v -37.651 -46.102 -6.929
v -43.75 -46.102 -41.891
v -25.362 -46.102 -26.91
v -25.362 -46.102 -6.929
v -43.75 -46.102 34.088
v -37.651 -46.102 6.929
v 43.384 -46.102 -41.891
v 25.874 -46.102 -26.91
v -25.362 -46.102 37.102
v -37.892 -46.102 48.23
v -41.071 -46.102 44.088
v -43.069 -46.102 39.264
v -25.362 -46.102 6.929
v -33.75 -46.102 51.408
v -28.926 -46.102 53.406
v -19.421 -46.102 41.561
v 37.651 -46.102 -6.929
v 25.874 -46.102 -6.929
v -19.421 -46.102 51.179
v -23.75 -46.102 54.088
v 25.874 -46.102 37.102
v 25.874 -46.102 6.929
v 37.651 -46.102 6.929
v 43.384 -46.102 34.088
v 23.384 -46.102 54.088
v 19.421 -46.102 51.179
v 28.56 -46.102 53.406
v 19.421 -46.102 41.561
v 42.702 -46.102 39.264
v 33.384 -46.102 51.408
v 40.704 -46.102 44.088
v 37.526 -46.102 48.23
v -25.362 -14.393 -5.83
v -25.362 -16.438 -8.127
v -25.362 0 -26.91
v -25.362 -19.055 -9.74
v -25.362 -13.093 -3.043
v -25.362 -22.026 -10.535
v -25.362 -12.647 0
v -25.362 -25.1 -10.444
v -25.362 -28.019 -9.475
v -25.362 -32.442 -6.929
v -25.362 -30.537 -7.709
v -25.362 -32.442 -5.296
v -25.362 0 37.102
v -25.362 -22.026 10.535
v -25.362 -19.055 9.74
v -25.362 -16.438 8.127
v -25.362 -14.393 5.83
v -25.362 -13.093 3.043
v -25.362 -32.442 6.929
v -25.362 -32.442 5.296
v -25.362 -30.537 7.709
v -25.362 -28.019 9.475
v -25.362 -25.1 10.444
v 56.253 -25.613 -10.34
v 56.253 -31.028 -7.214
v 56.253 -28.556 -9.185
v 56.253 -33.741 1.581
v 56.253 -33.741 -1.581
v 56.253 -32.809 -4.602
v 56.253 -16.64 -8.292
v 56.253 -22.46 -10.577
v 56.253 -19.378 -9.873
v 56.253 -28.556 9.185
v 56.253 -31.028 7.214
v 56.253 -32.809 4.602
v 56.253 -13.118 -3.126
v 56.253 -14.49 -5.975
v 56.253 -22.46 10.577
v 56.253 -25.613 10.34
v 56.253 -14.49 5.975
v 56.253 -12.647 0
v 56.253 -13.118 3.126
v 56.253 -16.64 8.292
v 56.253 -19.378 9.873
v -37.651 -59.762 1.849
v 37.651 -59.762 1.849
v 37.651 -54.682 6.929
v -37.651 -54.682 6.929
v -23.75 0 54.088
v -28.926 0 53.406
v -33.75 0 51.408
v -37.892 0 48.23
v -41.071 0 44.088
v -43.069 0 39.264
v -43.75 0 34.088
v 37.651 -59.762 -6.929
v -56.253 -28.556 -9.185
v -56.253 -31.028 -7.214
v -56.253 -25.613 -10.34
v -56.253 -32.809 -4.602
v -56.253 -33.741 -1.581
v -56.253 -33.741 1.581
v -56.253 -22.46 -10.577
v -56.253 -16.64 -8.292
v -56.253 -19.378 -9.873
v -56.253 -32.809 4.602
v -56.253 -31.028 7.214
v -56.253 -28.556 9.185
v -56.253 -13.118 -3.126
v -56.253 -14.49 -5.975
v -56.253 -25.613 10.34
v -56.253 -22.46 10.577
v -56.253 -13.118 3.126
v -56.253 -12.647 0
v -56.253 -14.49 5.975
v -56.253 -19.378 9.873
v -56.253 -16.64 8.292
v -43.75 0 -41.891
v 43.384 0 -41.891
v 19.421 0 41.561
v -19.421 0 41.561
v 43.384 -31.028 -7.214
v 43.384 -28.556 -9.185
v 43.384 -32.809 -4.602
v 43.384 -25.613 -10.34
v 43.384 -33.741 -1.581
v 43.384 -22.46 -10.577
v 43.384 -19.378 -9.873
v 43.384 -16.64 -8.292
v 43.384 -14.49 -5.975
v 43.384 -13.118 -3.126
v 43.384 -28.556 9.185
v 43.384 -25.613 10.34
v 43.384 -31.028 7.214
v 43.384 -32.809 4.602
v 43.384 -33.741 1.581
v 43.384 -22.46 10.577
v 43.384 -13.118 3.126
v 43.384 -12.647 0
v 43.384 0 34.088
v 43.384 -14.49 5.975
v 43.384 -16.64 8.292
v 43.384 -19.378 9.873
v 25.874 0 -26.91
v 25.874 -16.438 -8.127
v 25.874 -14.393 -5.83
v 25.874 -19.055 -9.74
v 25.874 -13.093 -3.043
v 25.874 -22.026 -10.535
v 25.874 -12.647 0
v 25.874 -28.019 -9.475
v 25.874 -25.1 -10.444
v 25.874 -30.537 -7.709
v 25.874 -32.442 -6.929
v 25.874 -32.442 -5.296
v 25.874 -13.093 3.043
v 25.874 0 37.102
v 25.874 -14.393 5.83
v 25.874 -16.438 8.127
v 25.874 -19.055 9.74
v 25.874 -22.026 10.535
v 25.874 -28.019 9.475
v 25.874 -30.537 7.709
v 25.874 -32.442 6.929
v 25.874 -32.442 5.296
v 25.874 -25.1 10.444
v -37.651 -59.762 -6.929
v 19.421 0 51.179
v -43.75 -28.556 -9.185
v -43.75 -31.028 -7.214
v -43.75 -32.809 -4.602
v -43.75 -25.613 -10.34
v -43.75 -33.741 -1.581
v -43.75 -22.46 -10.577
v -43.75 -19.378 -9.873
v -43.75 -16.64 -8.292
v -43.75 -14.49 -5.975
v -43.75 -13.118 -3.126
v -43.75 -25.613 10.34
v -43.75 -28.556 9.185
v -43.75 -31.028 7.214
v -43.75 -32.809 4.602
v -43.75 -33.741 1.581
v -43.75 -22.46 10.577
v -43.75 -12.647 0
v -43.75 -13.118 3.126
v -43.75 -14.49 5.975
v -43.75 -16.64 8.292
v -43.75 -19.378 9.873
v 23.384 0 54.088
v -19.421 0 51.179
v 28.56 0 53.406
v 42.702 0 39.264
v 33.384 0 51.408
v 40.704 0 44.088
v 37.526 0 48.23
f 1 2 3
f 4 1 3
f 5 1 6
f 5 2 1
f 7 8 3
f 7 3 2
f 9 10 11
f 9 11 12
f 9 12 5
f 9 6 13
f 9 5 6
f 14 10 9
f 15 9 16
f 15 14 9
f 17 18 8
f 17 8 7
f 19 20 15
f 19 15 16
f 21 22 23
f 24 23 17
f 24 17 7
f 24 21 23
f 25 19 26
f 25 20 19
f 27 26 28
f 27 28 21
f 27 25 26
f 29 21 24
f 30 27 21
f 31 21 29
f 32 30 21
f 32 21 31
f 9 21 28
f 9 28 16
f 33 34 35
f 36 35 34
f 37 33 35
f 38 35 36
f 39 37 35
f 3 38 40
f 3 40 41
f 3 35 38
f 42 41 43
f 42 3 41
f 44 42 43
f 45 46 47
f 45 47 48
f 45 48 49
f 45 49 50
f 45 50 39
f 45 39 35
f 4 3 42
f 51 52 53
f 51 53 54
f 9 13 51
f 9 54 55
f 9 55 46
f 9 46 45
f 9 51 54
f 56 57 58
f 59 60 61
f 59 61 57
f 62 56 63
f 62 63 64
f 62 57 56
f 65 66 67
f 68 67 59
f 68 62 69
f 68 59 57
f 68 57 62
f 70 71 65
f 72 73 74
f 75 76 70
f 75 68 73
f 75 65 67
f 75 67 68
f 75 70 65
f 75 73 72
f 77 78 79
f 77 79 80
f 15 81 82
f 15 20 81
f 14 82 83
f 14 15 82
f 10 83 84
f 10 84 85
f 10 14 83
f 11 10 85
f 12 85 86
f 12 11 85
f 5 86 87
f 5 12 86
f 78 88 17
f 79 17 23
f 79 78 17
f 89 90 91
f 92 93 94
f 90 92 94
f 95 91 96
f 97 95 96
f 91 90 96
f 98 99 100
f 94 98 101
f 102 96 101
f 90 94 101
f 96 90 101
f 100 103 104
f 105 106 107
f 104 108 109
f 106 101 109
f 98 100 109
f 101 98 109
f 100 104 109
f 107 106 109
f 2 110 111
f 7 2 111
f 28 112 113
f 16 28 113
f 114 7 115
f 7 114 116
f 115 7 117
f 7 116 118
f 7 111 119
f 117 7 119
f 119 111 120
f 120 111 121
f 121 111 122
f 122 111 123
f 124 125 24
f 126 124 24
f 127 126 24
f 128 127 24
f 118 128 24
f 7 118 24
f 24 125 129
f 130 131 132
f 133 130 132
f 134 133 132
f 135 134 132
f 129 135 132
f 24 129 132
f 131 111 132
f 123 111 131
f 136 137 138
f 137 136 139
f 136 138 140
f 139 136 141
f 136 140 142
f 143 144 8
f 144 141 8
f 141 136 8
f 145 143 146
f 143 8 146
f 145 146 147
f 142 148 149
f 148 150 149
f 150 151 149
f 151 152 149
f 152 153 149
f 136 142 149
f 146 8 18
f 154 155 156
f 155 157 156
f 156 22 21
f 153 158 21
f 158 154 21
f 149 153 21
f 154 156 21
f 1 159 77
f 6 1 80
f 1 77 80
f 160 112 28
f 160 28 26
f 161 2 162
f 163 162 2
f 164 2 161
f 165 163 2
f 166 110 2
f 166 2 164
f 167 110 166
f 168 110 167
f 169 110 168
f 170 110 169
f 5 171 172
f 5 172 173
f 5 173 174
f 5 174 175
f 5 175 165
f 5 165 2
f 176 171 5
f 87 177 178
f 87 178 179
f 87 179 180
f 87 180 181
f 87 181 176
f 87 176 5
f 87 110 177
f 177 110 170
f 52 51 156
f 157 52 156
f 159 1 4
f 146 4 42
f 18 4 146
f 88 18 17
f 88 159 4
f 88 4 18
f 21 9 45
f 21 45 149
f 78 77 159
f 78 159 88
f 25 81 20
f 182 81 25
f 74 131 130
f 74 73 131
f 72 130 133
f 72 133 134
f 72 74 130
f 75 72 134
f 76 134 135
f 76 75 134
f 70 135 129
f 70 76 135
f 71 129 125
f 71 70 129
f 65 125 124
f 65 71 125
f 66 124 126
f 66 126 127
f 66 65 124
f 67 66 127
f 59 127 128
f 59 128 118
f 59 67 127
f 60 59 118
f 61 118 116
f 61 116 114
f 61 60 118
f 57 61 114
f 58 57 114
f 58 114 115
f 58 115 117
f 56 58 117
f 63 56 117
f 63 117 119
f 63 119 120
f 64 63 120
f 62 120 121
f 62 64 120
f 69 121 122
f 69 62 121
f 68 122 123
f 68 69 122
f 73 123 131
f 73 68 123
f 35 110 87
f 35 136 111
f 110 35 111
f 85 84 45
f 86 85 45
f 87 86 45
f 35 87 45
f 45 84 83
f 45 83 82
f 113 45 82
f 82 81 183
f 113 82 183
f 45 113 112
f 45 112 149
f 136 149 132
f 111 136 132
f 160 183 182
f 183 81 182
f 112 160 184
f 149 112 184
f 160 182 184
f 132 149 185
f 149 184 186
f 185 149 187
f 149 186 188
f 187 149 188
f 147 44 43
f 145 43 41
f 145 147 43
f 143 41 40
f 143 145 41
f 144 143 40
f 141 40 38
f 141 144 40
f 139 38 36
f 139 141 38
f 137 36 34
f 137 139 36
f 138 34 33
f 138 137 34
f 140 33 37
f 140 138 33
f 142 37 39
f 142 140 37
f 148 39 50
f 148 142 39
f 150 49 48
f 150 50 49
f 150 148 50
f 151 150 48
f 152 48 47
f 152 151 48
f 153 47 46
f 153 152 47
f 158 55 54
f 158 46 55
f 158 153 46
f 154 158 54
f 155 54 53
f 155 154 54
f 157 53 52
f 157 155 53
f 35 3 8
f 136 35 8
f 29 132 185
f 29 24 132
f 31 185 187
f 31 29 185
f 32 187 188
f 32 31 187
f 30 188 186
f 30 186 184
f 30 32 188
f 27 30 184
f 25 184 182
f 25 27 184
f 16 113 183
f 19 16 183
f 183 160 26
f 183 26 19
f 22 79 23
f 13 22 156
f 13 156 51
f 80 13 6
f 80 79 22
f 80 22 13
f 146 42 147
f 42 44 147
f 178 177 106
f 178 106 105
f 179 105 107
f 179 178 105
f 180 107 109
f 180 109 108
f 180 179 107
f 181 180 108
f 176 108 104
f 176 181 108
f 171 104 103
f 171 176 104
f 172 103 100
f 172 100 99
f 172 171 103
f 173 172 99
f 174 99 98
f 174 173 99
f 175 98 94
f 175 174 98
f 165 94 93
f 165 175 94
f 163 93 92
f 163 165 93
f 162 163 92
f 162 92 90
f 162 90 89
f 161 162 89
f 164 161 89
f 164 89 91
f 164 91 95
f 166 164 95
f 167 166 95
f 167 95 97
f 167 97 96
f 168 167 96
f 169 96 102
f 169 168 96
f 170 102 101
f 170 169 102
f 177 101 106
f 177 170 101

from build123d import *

# Parameters (mm, degrees)
F0_W      = 87.133936584
F0_H      = 95.9787741303
F1_DEPTH  = 46.1022332311
F2_W      = 51.2357354164
F2_H      = 64.0120953321
F3_DEPTH  = 79.969028011
F6_R      = 10.6062460881
F7_DEPTH  = 56.2525093555
F8_W      = 38.8421155512
F8_H      = 9.6180737019
F9_DEPTH  = 59.3906808645
F10_W     = 51.2357354164
F10_H     = 13.8573199511
F10_W_2   = 11.7768868804
F10_W_3   = 12.2887119651
F11_DEPTH = 13.6597724631
F12_R     = 20
F13_SIZE  = 5.08


# Not quite as in the source:
# - a feature names something its author has since deleted; it is built from what else it names
# - the program builds the solid bodies; features that only make, move or delete a surface that nothing else refers to are left out


with BuildPart() as f1:
    # F0 (on Front) → F1 (new body)
    with BuildSketch(Plane.XZ):
        with Locations((-0.1830421388, 6.0982592404)):
            Rectangle(F0_W, F0_H)
    extrude(amount=F1_DEPTH)

    # F2 (on face) → F3 (cut)
    with BuildSketch(Plane.XZ.offset(46.1022332311)):
        with Locations((0.2559125423, 5.0961896777)):
            Rectangle(F2_W, F2_H)
    extrude(amount=-F3_DEPTH, mode=Mode.SUBTRACT)

    # F6 (on Right) → F7 (join, symmetric)
    with BuildSketch(Plane.YZ):
        with Locations((-23.2529193163, 0)):
            Circle(F6_R)
    extrude(amount=F7_DEPTH, both=True)

    # F8 (on face) → F9 (cut)
    with BuildSketch(Plane(origin=(0, 0, 0), x_dir=(-1, 0, 0), z_dir=(0, 1, 0))):
        with Locations((0, 46.3703721762)):
            Rectangle(F8_W, F8_H)
    extrude(amount=-F9_DEPTH, mode=Mode.SUBTRACT)

    # F10 (on face) → F11 (join, symmetric)
    with BuildSketch(Plane.XZ.offset(46.1022332311)):
        with Locations((0.2559125423, 0)):
            Rectangle(F10_W, F10_H)
        with Locations((31.7622236907, 0)):
            Rectangle(F10_W_2, F10_H)
        with Locations((-31.5063111484, 0)):
            Rectangle(F10_W_3, F10_H)
    extrude(amount=F11_DEPTH, both=True)

    # F12
    f12_edges = [f1.edges().sort_by_distance(p)[0] for p in [
        (-43.75001, -23.051117, 54.087646),
        (43.383926, -23.051117, 54.087646),
    ]]
    fillet(f12_edges, radius=F12_R)

    # F13
    f13_edges = [f1.edges().sort_by_distance(p)[0] for p in [
        (0, -59.762006, 6.92866),
    ]]
    chamfer(f13_edges, length=F13_SIZE)


solid = f1.part
